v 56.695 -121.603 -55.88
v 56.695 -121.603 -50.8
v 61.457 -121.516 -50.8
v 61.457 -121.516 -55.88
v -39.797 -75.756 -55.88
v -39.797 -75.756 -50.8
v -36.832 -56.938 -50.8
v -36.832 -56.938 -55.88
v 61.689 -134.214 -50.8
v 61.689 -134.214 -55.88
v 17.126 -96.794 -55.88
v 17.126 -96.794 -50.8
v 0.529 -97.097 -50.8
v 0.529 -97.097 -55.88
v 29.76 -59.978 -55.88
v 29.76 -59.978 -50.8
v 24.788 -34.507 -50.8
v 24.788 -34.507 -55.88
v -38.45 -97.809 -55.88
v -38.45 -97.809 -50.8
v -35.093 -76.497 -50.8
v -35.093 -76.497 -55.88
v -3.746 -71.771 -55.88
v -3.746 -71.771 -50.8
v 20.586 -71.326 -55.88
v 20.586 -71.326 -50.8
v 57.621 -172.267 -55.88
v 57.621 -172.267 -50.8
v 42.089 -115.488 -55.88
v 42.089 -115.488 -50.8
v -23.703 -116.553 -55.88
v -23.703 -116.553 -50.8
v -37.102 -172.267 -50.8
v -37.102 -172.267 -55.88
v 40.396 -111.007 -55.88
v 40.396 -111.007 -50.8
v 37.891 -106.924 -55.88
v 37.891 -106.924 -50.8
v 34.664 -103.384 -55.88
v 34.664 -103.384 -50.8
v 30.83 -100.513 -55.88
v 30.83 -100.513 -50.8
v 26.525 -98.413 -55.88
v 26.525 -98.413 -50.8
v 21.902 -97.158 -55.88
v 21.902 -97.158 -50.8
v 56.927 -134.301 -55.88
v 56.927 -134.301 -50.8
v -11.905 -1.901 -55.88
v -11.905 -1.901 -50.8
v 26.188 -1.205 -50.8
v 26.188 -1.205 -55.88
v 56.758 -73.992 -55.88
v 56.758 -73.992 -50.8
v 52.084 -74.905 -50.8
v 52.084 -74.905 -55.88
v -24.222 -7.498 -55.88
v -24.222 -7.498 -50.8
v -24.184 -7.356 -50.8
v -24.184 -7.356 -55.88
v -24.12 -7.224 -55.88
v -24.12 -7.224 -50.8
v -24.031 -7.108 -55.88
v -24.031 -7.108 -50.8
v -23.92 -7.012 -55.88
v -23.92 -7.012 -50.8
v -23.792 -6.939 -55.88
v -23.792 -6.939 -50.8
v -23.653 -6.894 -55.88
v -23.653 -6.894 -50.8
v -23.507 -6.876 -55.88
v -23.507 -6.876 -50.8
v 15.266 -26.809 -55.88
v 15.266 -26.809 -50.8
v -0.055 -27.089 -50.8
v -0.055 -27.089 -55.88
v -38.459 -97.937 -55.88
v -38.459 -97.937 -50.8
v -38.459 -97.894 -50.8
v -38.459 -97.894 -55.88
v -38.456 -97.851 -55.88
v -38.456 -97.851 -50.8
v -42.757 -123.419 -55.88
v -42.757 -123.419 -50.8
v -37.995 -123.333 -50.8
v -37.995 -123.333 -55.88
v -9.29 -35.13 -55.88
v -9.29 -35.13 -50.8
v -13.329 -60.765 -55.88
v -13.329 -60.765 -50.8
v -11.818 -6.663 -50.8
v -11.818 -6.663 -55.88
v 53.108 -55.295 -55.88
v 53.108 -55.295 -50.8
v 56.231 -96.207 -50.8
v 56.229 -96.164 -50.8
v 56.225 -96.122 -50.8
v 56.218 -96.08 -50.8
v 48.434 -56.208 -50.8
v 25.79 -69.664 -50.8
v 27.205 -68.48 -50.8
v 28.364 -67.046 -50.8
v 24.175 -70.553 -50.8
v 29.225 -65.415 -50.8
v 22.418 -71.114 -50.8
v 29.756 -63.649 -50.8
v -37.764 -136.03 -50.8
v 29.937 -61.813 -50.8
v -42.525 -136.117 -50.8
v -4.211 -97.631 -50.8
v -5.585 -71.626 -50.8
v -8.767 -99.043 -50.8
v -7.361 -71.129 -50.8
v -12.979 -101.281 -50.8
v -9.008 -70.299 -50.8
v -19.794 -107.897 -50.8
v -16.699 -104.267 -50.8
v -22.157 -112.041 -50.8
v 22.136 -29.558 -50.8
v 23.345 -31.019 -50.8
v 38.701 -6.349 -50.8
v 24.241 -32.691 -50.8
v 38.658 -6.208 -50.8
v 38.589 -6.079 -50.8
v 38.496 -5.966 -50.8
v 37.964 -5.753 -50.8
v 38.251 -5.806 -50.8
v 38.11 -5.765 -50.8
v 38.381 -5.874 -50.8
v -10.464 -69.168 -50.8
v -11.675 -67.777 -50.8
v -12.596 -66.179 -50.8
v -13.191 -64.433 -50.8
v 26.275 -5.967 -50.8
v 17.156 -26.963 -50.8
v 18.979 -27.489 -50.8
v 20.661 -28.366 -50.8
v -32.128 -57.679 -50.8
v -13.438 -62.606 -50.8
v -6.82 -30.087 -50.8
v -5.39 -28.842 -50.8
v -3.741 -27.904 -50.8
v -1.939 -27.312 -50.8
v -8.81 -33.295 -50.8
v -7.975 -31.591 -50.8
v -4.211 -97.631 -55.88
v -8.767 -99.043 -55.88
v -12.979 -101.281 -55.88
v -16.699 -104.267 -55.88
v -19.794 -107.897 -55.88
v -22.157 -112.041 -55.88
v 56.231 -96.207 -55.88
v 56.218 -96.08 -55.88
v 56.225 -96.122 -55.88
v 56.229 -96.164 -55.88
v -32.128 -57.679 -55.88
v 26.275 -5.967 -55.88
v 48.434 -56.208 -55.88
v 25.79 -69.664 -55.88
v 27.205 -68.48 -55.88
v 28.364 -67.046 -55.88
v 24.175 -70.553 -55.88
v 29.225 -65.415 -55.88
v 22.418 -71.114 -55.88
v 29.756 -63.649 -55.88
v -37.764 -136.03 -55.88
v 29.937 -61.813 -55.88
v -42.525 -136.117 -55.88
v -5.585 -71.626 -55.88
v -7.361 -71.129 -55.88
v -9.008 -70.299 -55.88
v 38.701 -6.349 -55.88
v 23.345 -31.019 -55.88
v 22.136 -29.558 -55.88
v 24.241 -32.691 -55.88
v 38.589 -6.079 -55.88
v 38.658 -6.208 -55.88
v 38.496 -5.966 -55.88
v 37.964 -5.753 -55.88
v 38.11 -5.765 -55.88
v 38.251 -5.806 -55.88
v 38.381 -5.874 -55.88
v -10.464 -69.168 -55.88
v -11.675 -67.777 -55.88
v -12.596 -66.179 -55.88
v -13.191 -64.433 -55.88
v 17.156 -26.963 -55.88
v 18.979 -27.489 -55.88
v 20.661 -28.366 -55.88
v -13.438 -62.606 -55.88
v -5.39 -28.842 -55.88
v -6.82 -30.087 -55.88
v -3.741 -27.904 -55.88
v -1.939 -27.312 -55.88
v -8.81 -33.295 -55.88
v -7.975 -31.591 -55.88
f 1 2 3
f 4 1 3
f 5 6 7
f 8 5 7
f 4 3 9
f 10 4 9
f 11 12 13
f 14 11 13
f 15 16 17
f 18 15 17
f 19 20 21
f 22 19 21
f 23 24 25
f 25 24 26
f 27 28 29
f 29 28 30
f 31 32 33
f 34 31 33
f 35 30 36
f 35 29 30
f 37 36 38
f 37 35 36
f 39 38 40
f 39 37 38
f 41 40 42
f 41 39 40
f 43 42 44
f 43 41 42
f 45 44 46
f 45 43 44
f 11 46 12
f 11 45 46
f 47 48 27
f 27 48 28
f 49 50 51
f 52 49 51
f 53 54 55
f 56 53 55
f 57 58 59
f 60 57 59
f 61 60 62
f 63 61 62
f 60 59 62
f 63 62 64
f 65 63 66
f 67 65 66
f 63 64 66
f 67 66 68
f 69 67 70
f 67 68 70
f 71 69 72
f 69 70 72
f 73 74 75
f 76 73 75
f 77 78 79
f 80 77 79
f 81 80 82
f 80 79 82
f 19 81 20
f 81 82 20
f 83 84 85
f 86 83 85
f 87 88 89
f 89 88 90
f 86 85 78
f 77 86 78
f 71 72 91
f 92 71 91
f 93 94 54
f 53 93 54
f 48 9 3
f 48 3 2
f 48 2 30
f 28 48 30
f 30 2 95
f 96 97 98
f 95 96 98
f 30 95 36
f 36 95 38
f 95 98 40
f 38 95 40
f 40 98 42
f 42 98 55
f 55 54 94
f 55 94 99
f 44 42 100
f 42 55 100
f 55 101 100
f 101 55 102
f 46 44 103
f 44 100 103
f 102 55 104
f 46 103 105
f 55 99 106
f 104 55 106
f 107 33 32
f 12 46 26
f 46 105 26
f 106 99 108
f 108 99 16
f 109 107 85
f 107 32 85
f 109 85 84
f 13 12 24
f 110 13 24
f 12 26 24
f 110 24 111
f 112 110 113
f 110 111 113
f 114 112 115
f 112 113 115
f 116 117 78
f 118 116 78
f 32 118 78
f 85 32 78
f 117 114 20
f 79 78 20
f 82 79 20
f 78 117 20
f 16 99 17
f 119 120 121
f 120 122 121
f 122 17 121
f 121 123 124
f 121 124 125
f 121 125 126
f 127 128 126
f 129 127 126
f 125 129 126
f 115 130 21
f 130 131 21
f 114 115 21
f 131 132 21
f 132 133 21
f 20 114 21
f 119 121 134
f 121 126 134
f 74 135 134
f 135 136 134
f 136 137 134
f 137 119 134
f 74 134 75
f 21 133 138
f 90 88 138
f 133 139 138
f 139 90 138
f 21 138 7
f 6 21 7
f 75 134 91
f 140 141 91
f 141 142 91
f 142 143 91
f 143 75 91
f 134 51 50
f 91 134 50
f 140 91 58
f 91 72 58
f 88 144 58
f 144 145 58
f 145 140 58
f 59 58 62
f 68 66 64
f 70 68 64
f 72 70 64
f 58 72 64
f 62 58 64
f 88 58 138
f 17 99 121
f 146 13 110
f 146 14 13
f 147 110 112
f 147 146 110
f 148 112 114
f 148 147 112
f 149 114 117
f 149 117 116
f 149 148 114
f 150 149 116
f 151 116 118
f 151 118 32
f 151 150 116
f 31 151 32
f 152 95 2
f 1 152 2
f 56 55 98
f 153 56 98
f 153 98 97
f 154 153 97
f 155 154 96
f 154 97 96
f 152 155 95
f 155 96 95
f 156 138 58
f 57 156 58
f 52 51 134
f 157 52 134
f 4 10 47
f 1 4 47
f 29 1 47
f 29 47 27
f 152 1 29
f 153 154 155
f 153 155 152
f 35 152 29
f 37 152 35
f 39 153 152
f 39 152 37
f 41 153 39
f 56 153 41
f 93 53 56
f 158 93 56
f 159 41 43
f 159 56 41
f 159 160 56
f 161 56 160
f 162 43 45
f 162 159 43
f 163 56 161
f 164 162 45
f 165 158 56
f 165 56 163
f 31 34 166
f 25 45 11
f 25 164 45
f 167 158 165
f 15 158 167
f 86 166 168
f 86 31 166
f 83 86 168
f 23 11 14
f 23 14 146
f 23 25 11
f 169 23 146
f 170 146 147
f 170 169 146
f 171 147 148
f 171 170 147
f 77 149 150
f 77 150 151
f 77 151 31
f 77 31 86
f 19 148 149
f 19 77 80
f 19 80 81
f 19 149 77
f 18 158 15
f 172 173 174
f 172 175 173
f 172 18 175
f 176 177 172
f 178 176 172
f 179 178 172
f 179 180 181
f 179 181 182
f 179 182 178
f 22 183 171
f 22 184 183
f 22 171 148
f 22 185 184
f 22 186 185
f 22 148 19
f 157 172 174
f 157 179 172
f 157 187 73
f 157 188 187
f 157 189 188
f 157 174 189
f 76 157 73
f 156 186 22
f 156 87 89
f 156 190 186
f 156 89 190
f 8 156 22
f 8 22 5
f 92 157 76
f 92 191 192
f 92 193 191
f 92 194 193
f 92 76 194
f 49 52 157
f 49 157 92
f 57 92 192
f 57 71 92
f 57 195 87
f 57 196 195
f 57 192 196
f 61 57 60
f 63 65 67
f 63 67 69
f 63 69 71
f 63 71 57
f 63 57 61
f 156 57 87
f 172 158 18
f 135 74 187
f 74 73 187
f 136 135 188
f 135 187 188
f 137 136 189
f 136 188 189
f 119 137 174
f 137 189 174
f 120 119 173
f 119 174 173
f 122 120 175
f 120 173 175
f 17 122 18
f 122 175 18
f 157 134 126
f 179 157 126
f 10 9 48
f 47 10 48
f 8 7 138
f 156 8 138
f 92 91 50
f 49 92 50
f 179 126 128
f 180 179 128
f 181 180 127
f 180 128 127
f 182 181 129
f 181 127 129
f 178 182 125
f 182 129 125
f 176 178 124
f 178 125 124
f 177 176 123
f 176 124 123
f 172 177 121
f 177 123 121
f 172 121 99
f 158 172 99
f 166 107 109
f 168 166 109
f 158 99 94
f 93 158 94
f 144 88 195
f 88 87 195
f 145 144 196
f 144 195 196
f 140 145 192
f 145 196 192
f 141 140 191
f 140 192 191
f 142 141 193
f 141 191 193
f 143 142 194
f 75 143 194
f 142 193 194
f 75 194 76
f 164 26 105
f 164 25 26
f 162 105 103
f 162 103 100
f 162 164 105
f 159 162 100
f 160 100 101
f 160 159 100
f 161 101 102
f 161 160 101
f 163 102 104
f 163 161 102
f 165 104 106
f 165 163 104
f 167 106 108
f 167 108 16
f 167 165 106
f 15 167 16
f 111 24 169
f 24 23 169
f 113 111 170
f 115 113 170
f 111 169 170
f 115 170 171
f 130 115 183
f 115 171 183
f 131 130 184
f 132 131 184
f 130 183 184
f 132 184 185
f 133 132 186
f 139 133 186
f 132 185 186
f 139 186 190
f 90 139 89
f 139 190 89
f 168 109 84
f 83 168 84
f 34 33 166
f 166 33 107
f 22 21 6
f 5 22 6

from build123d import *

# Parameters (mm, degrees)
BOSS_EXTRUDE2_DEPTH = 5.08
FILLET2_R           = 9.525
FILLET3_R           = 25.4


with BuildPart() as part:
    # Sketch5 → Boss-Extrude2 (new body)
    with BuildSketch(Plane(origin=(0, 0, -50.8), x_dir=(-1, 0, 0), z_dir=(0, 0, -1))):
        with BuildLine():
            Line((-52.084134713, -74.90469108), (-56.217901117, -96.079564574))
            ThreePointArc((-56.217901117, -96.079564574), (-56.227450796, -96.143111106), (-56.231425689, -96.207248133))
            Line((-56.231425689, -96.207248133), (-56.695270711, -121.603012501))
            Line((-56.695270711, -121.603012501), (-61.45697653, -121.516041559))
            Line((-61.45697653, -121.516041559), (-61.688899041, -134.213923743))
            Line((-61.688899041, -134.213923743), (-56.927193222, -134.300894684))
            Line((-56.927193222, -134.300894684), (-57.620624926, -172.266653317))
            Line((-57.620624926, -172.266653317), (-36.877249891, -96.432815008))
            Line((-36.877249891, -96.432815008), (19.109812826, -97.455399718))
            Line((19.109812826, -97.455399718), (37.101706355, -172.266653317))
            Line((37.101706355, -172.266653317), (37.763549432, -136.03038898))
            Line((37.763549432, -136.03038898), (42.525255251, -136.117359921))
            Line((42.525255251, -136.117359921), (42.757177762, -123.419477738))
            Line((42.757177762, -123.419477738), (37.995471943, -123.332506796))
            Line((37.995471943, -123.332506796), (38.459316965, -97.936742429))
            ThreePointArc((38.459316965, -97.936742429), (38.457686823, -97.872503028), (38.450464051, -97.808650153))
            Line((38.450464051, -97.808650153), (35.09270057, -76.496946406))
            Line((35.09270057, -76.496946406), (39.797167723, -75.755734526))
            Line((39.797167723, -75.755734526), (36.832320201, -56.937865912))
            Line((36.832320201, -56.937865912), (32.127853048, -57.679077792))
            Line((32.127853048, -57.679077792), (24.22159299, -7.498094822))
            ThreePointArc((24.22159299, -7.498094822), (23.977671585, -7.057207813), (23.507420242, -6.876258426))
            Line((23.507420242, -6.876258426), (11.818416858, -6.662762744))
            Line((11.818416858, -6.662762744), (11.905387799, -1.901056925))
            Line((11.905387799, -1.901056925), (-26.188258752, -1.205289392))
            Line((-26.188258752, -1.205289392), (-26.275229693, -5.966995211))
            Line((-26.275229693, -5.966995211), (-37.964233078, -5.753499529))
            ThreePointArc((-37.964233078, -5.753499529), (-38.44077853, -5.917155993), (-38.700637178, -6.348841631))
            Line((-38.700637178, -6.348841631), (-48.434089931, -56.20764123))
            Line((-48.434089931, -56.20764123), (-53.108352393, -55.295130035))
            Line((-53.108352393, -55.295130035), (-56.758397176, -73.992179884))
            Line((-56.758397176, -73.992179884), (-52.084134713, -74.90469108))
        make_face()
        Polygon((-31.935446416, -71.118839034), (-23.256774895, -26.66306829), (8.046213899, -27.234806762), (15.095699394, -71.977846959), align=None, mode=Mode.SUBTRACT)
    extrude(amount=BOSS_EXTRUDE2_DEPTH)

    # Fillet2
    fillet2_edges = [part.edges().sort_by_distance(p)[0] for p in [
        (31.935446416, -71.118839034, -53.34),
        (-15.095699394, -71.977846959, -53.34),
        (-8.046213899, -27.234806762, -53.34),
        (23.256774895, -26.66306829, -53.34),
    ]]
    fillet(fillet2_edges, radius=FILLET2_R)

    # Fillet3
    fillet3_edges = [part.edges().sort_by_distance(p)[0] for p in [
        (-19.109812826, -97.455399718, -53.34),
        (36.877249891, -96.432815008, -53.34),
    ]]
    fillet(fillet3_edges, radius=FILLET3_R)


solid = part.part
